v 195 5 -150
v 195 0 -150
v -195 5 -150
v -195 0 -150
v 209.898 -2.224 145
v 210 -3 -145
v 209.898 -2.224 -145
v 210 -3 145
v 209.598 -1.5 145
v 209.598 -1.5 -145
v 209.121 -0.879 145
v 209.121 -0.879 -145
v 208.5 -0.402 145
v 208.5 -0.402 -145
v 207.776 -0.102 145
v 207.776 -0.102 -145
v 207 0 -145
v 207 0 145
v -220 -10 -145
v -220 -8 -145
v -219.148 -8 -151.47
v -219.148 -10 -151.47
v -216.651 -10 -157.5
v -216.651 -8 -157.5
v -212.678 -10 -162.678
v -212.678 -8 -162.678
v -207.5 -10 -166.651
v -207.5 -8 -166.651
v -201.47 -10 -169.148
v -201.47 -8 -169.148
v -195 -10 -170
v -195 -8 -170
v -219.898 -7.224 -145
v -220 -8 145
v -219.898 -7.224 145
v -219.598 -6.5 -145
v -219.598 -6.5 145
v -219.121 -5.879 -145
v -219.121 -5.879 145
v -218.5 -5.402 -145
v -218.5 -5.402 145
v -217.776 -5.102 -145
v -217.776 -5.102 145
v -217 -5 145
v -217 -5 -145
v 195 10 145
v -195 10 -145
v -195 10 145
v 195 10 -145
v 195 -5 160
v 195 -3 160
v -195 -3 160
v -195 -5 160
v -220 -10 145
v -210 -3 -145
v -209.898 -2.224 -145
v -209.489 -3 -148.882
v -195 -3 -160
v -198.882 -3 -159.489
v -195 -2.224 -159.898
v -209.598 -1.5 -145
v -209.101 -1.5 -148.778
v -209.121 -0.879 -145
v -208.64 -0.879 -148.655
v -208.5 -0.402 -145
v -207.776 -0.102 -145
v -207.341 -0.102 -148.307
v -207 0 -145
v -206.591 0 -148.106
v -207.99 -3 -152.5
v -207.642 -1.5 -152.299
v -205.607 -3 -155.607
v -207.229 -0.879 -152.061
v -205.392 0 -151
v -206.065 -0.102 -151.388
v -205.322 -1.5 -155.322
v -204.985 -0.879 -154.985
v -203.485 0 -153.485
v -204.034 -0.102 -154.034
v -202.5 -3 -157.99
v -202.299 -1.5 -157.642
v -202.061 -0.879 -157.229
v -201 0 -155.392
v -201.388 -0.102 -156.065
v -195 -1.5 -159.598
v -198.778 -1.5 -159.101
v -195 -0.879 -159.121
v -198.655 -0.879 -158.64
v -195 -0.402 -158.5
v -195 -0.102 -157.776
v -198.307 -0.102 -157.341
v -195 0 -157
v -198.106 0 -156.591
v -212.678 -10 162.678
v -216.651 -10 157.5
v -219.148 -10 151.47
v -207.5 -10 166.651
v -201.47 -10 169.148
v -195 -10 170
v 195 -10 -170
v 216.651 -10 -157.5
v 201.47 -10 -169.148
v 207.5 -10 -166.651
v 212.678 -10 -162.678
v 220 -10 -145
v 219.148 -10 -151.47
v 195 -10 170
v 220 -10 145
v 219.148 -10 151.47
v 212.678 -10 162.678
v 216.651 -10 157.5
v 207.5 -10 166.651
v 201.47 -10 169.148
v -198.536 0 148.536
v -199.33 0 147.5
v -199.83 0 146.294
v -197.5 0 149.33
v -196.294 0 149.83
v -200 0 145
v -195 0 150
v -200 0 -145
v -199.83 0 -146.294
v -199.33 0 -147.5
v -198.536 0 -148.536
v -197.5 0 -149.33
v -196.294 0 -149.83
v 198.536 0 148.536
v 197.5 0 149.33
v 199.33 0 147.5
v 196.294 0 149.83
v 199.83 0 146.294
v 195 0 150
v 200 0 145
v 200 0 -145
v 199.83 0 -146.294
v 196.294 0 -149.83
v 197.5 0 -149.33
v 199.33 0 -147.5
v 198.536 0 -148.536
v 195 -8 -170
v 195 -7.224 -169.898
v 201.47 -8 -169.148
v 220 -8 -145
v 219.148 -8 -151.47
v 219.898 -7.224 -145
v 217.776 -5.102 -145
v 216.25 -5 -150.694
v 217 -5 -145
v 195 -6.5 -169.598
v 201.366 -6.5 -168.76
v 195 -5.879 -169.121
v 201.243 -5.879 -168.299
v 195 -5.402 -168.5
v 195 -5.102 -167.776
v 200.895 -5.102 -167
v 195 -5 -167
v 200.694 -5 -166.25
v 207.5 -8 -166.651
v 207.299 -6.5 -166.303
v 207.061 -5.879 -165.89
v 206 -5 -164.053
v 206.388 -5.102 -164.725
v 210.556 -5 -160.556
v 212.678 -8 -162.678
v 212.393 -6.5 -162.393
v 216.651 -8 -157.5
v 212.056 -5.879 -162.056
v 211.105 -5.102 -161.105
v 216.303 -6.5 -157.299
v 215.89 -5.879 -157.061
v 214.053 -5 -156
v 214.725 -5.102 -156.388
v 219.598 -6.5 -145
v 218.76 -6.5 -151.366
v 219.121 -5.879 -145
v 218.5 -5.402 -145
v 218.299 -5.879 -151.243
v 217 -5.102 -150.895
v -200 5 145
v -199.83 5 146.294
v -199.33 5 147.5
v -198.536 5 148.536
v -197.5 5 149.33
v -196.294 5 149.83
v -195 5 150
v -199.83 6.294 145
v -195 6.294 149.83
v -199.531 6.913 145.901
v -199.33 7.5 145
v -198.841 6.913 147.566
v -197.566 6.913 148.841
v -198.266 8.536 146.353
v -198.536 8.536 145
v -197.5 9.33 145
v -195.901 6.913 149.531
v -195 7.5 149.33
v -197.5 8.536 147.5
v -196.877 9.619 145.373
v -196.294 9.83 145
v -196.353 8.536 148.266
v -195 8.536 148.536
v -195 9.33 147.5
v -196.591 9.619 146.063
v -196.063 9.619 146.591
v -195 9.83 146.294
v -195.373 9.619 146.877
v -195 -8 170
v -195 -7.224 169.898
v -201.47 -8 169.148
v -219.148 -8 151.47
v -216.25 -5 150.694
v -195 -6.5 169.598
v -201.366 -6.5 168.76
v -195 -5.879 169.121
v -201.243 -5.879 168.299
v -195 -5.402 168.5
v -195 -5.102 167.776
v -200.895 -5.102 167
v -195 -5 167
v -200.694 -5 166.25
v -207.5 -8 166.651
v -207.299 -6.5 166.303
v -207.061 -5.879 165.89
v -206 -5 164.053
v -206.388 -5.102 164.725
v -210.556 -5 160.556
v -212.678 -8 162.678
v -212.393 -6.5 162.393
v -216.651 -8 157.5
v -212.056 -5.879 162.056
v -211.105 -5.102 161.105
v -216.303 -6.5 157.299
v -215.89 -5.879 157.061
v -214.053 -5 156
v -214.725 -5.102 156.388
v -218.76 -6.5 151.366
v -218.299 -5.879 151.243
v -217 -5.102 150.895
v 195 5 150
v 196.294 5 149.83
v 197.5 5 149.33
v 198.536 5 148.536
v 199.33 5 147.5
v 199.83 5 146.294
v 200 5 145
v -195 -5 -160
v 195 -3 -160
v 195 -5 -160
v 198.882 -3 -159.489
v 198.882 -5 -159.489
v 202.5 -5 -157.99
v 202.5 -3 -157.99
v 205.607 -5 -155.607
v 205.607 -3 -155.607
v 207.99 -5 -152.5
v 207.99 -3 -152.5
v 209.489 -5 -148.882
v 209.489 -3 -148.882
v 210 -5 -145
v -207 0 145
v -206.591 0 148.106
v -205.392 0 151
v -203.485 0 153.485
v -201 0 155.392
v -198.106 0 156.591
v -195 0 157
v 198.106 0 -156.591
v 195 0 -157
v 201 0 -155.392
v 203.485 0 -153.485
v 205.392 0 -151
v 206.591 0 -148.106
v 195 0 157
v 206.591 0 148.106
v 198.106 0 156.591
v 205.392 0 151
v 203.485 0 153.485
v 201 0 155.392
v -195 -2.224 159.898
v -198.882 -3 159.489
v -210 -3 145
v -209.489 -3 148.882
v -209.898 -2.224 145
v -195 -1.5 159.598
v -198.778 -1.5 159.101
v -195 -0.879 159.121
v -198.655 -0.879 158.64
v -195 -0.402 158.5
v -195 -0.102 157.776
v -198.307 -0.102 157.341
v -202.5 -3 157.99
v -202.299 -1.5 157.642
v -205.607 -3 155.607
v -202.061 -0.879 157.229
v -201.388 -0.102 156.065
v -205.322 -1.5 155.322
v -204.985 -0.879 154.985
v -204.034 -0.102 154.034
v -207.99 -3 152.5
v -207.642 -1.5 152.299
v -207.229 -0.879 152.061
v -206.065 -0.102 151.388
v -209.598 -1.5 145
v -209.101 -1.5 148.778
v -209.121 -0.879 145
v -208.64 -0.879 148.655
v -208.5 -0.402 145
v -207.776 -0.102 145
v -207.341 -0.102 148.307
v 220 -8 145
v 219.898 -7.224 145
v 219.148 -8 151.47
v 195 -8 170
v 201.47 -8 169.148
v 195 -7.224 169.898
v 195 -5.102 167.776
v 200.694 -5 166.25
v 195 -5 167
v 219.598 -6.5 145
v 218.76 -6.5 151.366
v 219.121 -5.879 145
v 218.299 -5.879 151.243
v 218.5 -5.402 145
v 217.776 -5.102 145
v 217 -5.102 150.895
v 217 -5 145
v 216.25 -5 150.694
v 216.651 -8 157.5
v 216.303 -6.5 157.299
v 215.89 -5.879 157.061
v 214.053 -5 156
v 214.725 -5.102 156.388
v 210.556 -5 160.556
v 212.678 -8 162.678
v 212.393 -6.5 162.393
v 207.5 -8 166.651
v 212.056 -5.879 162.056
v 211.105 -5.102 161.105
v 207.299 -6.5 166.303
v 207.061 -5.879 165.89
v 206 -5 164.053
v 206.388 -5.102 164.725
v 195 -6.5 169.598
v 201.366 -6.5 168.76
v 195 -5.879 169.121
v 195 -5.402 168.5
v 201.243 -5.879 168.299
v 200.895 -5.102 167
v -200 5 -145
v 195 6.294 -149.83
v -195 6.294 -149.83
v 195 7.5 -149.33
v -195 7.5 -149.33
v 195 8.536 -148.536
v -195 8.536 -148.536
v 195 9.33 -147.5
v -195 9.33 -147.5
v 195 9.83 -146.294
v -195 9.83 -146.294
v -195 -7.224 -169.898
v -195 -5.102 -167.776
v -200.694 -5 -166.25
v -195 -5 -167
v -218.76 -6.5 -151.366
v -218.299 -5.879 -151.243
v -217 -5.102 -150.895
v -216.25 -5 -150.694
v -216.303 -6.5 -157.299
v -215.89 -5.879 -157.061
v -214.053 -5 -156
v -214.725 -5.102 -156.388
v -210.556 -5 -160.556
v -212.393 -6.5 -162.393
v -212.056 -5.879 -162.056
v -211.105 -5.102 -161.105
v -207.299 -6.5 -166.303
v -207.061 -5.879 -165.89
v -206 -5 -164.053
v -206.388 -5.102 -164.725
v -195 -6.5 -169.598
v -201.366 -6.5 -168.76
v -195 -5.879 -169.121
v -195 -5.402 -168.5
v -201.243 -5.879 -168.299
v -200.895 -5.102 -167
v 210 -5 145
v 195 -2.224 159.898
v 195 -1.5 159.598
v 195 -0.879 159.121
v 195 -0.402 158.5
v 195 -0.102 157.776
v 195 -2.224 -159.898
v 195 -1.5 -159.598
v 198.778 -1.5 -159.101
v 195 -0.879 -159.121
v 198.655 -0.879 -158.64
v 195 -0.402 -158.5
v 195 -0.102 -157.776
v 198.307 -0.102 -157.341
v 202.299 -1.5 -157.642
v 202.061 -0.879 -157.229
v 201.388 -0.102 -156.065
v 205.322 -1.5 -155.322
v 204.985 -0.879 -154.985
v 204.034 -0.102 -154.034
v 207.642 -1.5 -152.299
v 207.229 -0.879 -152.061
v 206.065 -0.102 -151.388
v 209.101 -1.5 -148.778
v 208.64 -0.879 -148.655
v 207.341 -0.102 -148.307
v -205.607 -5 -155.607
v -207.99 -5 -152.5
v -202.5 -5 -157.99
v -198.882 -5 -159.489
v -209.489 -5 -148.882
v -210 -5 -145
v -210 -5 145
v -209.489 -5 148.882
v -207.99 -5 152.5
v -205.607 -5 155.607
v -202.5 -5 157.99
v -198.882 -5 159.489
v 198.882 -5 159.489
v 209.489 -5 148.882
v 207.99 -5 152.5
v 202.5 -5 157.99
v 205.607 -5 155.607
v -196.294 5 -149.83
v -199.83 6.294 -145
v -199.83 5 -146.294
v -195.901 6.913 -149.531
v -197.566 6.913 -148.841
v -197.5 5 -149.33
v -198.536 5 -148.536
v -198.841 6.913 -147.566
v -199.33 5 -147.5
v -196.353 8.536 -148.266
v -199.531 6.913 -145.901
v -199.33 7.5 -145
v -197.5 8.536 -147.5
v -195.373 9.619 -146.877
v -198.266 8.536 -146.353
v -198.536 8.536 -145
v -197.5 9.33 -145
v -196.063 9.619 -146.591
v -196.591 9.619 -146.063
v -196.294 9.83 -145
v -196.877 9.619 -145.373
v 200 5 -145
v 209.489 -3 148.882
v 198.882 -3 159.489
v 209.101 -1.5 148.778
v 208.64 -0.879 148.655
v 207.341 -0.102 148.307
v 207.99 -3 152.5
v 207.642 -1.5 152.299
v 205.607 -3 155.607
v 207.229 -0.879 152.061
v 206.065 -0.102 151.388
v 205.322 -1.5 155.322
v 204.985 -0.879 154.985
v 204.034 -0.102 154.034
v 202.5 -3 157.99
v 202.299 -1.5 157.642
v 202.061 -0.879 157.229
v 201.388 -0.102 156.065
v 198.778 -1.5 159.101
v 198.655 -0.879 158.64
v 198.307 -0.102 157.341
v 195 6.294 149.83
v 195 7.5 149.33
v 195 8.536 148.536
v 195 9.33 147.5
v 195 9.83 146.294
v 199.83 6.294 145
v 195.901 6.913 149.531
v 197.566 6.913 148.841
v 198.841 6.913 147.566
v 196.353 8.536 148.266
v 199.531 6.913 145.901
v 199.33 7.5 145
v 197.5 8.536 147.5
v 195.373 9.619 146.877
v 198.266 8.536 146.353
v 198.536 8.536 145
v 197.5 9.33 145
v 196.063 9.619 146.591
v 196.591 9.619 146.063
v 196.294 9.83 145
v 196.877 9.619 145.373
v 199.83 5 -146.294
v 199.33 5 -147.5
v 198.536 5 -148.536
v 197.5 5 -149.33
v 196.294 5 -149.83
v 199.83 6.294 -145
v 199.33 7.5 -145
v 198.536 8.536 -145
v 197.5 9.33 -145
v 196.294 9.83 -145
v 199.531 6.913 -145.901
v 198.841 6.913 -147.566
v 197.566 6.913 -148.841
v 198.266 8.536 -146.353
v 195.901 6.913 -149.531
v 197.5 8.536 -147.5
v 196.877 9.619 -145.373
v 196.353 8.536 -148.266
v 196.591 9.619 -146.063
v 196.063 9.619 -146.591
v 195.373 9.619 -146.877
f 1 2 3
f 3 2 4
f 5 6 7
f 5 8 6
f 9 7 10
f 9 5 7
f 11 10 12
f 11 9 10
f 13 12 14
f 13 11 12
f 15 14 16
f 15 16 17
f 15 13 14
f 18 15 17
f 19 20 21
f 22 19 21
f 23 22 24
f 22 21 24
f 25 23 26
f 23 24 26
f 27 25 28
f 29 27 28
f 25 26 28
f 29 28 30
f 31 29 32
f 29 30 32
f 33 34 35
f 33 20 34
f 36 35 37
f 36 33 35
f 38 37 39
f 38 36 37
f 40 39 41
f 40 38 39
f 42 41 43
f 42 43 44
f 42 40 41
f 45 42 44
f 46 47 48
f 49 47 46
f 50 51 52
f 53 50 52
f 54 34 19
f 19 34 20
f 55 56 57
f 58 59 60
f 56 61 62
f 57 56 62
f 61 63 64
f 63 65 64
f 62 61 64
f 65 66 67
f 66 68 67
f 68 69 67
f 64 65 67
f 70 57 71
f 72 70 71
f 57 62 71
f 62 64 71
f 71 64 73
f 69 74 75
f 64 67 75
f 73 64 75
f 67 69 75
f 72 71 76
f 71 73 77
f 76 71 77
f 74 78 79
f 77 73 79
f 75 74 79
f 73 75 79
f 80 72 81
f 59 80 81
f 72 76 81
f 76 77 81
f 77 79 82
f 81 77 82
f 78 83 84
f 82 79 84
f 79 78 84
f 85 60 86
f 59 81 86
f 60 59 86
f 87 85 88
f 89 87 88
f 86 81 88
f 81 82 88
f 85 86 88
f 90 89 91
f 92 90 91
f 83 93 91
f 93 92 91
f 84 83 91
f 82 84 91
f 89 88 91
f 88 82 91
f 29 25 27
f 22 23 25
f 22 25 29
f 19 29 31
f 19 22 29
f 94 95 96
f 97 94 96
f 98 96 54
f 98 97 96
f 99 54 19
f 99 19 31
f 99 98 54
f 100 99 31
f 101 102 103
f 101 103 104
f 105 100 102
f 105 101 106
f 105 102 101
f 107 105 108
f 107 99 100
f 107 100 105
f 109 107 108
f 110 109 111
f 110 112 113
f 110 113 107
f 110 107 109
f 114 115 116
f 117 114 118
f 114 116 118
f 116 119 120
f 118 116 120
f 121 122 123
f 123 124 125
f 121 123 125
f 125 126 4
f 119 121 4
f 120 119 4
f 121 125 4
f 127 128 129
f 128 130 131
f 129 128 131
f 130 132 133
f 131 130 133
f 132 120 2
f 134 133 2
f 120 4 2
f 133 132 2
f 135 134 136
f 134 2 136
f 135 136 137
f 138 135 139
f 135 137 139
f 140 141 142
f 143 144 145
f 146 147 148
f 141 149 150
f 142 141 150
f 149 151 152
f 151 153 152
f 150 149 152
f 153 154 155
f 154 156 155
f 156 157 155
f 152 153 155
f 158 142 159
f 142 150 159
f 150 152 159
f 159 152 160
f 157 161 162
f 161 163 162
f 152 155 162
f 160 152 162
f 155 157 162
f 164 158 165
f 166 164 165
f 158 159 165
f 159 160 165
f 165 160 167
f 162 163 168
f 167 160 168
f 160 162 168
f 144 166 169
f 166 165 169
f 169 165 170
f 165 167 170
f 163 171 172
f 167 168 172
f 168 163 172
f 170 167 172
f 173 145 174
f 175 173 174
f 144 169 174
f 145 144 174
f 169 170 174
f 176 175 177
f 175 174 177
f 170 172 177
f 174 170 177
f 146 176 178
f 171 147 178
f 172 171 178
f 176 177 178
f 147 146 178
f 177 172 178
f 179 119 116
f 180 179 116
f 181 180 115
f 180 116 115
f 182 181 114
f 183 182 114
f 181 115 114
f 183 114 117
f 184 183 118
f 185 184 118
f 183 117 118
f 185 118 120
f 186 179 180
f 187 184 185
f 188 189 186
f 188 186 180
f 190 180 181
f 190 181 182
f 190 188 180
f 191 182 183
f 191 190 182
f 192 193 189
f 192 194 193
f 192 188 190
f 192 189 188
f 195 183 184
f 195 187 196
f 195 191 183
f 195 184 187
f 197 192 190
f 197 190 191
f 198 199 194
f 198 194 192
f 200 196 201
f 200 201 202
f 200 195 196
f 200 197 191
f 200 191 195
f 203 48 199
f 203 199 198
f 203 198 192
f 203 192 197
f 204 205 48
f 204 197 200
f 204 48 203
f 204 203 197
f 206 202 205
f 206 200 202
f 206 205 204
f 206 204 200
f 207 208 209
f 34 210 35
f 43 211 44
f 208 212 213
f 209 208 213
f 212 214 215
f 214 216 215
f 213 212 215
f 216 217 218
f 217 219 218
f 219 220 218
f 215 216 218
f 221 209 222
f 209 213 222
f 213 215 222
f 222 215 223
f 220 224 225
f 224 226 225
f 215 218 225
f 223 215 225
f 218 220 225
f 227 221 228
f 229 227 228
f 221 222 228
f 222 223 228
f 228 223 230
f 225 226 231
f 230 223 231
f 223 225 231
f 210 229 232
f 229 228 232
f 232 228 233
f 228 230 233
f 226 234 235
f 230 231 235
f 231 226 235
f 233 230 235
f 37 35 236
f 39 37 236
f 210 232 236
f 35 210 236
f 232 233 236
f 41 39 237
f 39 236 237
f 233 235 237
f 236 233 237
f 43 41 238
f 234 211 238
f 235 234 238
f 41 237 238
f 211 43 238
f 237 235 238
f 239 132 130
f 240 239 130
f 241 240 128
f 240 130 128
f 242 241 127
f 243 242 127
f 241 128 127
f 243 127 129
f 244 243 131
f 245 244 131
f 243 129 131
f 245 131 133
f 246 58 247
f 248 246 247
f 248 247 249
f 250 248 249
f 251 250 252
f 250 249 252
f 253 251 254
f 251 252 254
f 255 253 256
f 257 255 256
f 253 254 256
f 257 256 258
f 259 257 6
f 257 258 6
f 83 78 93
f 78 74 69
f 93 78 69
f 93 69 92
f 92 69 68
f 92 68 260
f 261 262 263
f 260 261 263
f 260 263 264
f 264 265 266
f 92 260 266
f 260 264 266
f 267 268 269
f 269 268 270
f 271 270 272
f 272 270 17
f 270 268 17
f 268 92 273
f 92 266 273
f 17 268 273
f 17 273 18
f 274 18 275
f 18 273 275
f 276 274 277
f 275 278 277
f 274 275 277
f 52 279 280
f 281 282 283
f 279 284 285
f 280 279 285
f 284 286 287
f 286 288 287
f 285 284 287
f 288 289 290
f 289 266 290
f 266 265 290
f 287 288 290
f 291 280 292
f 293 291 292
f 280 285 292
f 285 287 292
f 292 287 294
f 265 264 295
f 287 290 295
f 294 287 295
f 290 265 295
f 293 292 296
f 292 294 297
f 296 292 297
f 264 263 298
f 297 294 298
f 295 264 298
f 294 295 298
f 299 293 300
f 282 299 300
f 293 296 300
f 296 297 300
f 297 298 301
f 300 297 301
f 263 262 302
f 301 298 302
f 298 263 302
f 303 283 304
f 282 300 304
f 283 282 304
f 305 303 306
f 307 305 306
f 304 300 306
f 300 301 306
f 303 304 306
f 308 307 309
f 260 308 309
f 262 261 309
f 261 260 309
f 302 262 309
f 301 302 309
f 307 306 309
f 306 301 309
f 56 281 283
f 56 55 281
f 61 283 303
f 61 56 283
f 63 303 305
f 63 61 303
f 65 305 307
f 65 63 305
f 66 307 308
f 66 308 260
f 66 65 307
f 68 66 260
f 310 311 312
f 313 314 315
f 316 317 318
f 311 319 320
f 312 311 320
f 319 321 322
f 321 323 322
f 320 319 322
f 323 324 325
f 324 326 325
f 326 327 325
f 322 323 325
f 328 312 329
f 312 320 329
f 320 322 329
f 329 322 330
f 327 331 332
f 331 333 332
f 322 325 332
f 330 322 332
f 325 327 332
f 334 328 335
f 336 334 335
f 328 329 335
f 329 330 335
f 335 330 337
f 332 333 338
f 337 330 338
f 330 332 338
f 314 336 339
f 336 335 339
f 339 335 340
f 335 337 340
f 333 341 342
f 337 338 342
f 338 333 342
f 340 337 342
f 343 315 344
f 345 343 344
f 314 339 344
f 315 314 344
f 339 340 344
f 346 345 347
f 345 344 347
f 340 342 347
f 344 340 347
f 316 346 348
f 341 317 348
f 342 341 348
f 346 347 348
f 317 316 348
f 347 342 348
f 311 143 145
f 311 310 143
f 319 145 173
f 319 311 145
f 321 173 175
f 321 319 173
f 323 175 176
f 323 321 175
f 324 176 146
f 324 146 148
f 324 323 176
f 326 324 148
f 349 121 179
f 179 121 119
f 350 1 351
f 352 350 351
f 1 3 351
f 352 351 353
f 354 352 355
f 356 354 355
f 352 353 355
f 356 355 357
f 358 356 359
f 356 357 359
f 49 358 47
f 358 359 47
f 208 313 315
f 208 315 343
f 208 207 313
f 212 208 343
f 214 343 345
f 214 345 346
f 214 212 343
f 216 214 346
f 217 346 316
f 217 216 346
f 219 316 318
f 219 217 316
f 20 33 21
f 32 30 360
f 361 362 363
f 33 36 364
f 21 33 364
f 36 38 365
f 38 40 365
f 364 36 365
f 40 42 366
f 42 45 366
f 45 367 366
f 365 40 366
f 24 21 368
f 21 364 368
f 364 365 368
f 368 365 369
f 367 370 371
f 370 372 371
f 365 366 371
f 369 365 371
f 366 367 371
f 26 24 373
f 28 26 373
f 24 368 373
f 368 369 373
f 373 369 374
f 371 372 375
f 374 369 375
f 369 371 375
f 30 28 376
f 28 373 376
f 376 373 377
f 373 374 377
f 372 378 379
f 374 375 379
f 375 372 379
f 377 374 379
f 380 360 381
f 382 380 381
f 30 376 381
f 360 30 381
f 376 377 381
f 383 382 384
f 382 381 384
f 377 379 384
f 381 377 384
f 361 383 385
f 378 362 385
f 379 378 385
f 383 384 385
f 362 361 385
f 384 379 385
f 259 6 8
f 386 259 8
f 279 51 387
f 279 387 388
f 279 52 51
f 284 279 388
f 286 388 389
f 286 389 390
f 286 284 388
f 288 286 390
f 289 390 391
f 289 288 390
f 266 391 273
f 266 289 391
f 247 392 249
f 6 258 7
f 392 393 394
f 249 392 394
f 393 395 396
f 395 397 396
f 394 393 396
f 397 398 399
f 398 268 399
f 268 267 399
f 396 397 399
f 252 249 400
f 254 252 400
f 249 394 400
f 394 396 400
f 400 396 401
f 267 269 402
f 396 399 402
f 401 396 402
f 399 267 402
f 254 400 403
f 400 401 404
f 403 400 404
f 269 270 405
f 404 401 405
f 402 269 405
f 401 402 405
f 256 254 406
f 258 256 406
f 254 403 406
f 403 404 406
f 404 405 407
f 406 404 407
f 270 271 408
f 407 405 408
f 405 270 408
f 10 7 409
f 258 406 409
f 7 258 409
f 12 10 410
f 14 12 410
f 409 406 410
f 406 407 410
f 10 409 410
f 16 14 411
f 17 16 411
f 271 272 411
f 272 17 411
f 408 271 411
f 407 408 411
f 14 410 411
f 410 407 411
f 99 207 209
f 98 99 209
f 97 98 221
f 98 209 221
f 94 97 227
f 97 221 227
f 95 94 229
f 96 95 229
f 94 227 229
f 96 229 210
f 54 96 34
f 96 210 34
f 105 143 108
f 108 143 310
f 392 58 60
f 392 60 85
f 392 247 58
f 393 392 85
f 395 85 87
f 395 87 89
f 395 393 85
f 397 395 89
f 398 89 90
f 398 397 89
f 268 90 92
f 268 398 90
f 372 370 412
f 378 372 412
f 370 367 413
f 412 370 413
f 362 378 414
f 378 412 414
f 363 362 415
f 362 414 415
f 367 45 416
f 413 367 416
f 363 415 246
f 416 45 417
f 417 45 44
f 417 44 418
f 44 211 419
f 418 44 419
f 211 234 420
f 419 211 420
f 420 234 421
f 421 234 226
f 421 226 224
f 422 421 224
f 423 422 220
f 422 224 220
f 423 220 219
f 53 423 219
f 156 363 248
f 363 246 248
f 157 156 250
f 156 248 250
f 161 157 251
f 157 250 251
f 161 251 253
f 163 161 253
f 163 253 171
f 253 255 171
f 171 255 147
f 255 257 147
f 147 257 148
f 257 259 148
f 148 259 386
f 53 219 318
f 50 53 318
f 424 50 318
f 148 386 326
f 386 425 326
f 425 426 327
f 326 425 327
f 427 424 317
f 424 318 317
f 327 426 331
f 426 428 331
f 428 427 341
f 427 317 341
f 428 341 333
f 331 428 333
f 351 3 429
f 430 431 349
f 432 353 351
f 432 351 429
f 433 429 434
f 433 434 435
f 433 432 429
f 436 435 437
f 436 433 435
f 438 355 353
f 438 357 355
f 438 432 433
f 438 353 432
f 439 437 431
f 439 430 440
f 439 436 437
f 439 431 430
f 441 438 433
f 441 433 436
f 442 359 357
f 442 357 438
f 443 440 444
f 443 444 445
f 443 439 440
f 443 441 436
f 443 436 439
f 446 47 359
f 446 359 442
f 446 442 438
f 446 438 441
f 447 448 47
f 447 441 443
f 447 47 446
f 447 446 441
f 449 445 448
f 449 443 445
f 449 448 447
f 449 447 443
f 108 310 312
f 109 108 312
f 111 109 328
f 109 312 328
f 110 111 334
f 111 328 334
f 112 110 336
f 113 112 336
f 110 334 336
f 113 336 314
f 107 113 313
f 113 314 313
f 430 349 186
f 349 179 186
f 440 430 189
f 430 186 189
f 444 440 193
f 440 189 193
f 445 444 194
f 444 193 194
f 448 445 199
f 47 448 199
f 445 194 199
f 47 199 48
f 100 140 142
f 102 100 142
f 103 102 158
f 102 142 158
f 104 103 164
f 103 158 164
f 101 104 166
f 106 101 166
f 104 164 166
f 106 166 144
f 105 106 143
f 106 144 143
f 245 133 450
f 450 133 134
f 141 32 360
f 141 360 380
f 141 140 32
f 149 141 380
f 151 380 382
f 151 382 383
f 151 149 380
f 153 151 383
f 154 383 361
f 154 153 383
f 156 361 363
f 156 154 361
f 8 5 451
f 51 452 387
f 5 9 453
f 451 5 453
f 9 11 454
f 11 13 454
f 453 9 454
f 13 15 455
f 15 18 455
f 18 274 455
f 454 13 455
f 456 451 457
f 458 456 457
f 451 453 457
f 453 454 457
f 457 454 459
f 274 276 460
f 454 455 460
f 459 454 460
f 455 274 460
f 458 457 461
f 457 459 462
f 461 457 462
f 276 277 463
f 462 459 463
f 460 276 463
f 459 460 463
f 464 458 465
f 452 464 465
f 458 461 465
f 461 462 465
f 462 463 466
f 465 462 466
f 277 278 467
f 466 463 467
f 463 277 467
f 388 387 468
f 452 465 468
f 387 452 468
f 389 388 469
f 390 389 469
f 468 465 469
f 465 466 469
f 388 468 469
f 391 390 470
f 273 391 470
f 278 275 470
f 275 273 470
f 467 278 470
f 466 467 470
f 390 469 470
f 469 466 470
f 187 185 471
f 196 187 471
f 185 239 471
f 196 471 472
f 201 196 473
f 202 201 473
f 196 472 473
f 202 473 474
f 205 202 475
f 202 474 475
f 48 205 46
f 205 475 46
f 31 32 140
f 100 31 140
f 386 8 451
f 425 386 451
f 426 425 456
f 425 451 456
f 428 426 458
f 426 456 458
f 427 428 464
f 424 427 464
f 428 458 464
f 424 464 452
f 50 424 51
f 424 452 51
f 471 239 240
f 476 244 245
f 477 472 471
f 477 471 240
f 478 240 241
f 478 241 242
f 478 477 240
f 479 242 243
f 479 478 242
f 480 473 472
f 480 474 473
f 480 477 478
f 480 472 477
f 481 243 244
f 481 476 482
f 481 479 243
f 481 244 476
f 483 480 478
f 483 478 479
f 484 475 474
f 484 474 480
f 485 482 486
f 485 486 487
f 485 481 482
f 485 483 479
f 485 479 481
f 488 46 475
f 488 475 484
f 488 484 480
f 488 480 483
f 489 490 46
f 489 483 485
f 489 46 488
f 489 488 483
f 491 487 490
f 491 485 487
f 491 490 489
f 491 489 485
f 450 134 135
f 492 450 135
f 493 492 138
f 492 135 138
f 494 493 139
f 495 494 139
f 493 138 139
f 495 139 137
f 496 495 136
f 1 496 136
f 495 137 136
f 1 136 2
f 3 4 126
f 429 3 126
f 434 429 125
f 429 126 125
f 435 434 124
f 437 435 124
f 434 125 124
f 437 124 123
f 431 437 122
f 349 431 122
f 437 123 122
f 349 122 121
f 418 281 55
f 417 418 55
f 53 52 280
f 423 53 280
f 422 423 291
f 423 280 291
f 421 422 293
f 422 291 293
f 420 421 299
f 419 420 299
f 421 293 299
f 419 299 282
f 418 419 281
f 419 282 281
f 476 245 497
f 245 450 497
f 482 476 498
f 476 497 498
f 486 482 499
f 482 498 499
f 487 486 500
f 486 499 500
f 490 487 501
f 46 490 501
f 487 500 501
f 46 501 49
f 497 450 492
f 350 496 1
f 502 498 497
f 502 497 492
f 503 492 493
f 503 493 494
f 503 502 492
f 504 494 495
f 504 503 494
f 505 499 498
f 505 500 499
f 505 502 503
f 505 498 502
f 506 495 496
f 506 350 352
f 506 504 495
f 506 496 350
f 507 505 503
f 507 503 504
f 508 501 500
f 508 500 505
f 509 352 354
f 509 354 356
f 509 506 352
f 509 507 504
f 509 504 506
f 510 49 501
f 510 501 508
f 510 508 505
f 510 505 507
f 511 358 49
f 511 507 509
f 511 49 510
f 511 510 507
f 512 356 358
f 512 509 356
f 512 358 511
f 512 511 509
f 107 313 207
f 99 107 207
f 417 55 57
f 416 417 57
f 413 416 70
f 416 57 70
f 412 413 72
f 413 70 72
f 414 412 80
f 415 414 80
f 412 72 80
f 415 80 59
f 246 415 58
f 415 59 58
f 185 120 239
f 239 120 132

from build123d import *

# Parameters (mm, degrees)
BOSS_EXTRUDE1_DEPTH = 10
FILLET1_R           = 5
BOSS_EXTRUDE2_DEPTH = 5
BOSS_EXTRUDE3_DEPTH = 5
FILLET2_R           = 3


with BuildPart() as part:
    # Sketch1 → Boss-Extrude1 (new body)
    with BuildSketch(Plane(origin=(0, 0, 0), x_dir=(1, 0, 0), z_dir=(0, 1, 0))):
        with BuildLine():
            Line((-195, -150), (195, -150))
            ThreePointArc((195, -150), (198.535533906, -148.535533906), (200, -145))
            Line((200, -145), (200, 145))
            ThreePointArc((200, 145), (198.535533906, 148.535533906), (195, 150))
            Line((195, 150), (-195, 150))
            ThreePointArc((-195, 150), (-198.535533906, 148.535533906), (-200, 145))
            Line((-200, 145), (-200, -145))
            ThreePointArc((-200, -145), (-198.535533906, -148.535533906), (-195, -150))
        make_face()
    extrude(amount=BOSS_EXTRUDE1_DEPTH)

    # Fillet1
    fillet1_edges = [part.edges().sort_by_distance(p)[0] for p in [
        (198.535533906, 10, 148.535533906),
        (200, 10, 0),
        (198.535533906, 10, -148.535533906),
        (0, 10, -150),
        (-198.535533906, 10, -148.535533906),
        (-200, 10, 0),
        (-198.535533906, 10, 148.535533906),
        (0, 10, 150),
    ]]
    fillet(fillet1_edges, radius=FILLET1_R)


with BuildPart() as body_2:
    # Sketch4 → Boss-Extrude2 (new body)
    with BuildSketch(Plane.XZ):
        with BuildLine():
            Line((-210, 145), (-210, -145))
            ThreePointArc((-210, -145), (-205.606601718, -155.606601718), (-195, -160))
            Line((-195, -160), (195, -160))
            ThreePointArc((195, -160), (205.606601718, -155.606601718), (210, -145))
            Line((210, -145), (210, 145))
            ThreePointArc((210, 145), (205.606601718, 155.606601718), (195, 160))
            Line((195, 160), (-195, 160))
            ThreePointArc((-195, 160), (-205.606601718, 155.606601718), (-210, 145))
        make_face()
    extrude(amount=BOSS_EXTRUDE2_DEPTH)

    # Sketch5 → Boss-Extrude3 (add)
    with BuildSketch(Plane.XZ.offset(5)):
        with BuildLine():
            Line((-220, 145), (-220, -145))
            ThreePointArc((-220, -145), (-212.67766953, -162.67766953), (-195, -170))
            Line((-195, -170), (195, -170))
            ThreePointArc((195, -170), (212.67766953, -162.67766953), (220, -145))
            Line((220, -145), (220, 145))
            ThreePointArc((220, 145), (212.67766953, 162.67766953), (195, 170))
            Line((195, 170), (-195, 170))
            ThreePointArc((-195, 170), (-212.67766953, 162.67766953), (-220, 145))
        make_face()
    extrude(amount=BOSS_EXTRUDE3_DEPTH)

    # Fillet2
    fillet2_edges = [body_2.edges().sort_by_distance(p)[0] for p in [
        (0, 0, -160),
        (-205.606601718, 0, -155.606601718),
        (-210, 0, 0),
        (-205.606601718, 0, 155.606601718),
        (-212.67766953, -5, 162.67766953),
        (-220, -5, 0),
        (-212.67766953, -5, -162.67766953),
        (0, -5, -170),
        (212.67766953, -5, -162.67766953),
        (220, -5, 0),
        (212.67766953, -5, 162.67766953),
        (0, -5, 170),
        (0, 0, 160),
        (205.606601718, 0, 155.606601718),
        (210, 0, 0),
        (205.606601718, 0, -155.606601718),
    ]]
    fillet(fillet2_edges, radius=FILLET2_R)


solid = Compound([part.part, body_2.part])
